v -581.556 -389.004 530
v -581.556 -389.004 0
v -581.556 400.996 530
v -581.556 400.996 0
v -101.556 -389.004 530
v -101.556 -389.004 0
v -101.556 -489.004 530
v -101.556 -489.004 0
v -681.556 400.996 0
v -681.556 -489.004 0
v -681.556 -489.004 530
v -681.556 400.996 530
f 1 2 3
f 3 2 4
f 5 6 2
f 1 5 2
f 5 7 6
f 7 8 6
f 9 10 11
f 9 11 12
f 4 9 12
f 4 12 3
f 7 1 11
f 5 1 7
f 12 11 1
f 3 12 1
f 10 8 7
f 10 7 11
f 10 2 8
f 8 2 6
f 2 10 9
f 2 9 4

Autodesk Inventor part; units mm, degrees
ref_plane "YZ Plane" through (0, 0, 0) normal (1, 0, 0) x (0, 1, 0)
ref_plane "XZ Plane" through (0, 0, 0) normal (0, 1, 0) x (-1, 0, 0)
ref_plane "XY Plane" through (0, 0, 0) normal (0, 0, 1) x (1, 0, 0)
sketch "Boceto3" plane through (0, 0, 0) normal (0, 0, 1) x (1, 0, 0)
  line L0 (-681.5559, 400.996) -> (-581.5559, 400.996)
  line L1 (-101.5559, -489.004) -> (-681.5559, -489.004)
  line L2 (-681.5559, -489.004) -> (-681.5559, 400.996)
  line L3 (-101.5559, -489.004) -> (-101.5559, -389.004)
  line L4 (-101.5559, -389.004) -> (-581.5559, -389.004)
  line L5 (-581.5559, -389.004) -> (-581.5559, 400.996)
  point P0 (0, 0)
  dimension "d0" = 580
  dimension "d2" = 100
  dimension "d3" = 480
extrude "Extrusión1" add sketch "Boceto3" along normal blind 530
properties part number "silla aleta" material "Sillas"
